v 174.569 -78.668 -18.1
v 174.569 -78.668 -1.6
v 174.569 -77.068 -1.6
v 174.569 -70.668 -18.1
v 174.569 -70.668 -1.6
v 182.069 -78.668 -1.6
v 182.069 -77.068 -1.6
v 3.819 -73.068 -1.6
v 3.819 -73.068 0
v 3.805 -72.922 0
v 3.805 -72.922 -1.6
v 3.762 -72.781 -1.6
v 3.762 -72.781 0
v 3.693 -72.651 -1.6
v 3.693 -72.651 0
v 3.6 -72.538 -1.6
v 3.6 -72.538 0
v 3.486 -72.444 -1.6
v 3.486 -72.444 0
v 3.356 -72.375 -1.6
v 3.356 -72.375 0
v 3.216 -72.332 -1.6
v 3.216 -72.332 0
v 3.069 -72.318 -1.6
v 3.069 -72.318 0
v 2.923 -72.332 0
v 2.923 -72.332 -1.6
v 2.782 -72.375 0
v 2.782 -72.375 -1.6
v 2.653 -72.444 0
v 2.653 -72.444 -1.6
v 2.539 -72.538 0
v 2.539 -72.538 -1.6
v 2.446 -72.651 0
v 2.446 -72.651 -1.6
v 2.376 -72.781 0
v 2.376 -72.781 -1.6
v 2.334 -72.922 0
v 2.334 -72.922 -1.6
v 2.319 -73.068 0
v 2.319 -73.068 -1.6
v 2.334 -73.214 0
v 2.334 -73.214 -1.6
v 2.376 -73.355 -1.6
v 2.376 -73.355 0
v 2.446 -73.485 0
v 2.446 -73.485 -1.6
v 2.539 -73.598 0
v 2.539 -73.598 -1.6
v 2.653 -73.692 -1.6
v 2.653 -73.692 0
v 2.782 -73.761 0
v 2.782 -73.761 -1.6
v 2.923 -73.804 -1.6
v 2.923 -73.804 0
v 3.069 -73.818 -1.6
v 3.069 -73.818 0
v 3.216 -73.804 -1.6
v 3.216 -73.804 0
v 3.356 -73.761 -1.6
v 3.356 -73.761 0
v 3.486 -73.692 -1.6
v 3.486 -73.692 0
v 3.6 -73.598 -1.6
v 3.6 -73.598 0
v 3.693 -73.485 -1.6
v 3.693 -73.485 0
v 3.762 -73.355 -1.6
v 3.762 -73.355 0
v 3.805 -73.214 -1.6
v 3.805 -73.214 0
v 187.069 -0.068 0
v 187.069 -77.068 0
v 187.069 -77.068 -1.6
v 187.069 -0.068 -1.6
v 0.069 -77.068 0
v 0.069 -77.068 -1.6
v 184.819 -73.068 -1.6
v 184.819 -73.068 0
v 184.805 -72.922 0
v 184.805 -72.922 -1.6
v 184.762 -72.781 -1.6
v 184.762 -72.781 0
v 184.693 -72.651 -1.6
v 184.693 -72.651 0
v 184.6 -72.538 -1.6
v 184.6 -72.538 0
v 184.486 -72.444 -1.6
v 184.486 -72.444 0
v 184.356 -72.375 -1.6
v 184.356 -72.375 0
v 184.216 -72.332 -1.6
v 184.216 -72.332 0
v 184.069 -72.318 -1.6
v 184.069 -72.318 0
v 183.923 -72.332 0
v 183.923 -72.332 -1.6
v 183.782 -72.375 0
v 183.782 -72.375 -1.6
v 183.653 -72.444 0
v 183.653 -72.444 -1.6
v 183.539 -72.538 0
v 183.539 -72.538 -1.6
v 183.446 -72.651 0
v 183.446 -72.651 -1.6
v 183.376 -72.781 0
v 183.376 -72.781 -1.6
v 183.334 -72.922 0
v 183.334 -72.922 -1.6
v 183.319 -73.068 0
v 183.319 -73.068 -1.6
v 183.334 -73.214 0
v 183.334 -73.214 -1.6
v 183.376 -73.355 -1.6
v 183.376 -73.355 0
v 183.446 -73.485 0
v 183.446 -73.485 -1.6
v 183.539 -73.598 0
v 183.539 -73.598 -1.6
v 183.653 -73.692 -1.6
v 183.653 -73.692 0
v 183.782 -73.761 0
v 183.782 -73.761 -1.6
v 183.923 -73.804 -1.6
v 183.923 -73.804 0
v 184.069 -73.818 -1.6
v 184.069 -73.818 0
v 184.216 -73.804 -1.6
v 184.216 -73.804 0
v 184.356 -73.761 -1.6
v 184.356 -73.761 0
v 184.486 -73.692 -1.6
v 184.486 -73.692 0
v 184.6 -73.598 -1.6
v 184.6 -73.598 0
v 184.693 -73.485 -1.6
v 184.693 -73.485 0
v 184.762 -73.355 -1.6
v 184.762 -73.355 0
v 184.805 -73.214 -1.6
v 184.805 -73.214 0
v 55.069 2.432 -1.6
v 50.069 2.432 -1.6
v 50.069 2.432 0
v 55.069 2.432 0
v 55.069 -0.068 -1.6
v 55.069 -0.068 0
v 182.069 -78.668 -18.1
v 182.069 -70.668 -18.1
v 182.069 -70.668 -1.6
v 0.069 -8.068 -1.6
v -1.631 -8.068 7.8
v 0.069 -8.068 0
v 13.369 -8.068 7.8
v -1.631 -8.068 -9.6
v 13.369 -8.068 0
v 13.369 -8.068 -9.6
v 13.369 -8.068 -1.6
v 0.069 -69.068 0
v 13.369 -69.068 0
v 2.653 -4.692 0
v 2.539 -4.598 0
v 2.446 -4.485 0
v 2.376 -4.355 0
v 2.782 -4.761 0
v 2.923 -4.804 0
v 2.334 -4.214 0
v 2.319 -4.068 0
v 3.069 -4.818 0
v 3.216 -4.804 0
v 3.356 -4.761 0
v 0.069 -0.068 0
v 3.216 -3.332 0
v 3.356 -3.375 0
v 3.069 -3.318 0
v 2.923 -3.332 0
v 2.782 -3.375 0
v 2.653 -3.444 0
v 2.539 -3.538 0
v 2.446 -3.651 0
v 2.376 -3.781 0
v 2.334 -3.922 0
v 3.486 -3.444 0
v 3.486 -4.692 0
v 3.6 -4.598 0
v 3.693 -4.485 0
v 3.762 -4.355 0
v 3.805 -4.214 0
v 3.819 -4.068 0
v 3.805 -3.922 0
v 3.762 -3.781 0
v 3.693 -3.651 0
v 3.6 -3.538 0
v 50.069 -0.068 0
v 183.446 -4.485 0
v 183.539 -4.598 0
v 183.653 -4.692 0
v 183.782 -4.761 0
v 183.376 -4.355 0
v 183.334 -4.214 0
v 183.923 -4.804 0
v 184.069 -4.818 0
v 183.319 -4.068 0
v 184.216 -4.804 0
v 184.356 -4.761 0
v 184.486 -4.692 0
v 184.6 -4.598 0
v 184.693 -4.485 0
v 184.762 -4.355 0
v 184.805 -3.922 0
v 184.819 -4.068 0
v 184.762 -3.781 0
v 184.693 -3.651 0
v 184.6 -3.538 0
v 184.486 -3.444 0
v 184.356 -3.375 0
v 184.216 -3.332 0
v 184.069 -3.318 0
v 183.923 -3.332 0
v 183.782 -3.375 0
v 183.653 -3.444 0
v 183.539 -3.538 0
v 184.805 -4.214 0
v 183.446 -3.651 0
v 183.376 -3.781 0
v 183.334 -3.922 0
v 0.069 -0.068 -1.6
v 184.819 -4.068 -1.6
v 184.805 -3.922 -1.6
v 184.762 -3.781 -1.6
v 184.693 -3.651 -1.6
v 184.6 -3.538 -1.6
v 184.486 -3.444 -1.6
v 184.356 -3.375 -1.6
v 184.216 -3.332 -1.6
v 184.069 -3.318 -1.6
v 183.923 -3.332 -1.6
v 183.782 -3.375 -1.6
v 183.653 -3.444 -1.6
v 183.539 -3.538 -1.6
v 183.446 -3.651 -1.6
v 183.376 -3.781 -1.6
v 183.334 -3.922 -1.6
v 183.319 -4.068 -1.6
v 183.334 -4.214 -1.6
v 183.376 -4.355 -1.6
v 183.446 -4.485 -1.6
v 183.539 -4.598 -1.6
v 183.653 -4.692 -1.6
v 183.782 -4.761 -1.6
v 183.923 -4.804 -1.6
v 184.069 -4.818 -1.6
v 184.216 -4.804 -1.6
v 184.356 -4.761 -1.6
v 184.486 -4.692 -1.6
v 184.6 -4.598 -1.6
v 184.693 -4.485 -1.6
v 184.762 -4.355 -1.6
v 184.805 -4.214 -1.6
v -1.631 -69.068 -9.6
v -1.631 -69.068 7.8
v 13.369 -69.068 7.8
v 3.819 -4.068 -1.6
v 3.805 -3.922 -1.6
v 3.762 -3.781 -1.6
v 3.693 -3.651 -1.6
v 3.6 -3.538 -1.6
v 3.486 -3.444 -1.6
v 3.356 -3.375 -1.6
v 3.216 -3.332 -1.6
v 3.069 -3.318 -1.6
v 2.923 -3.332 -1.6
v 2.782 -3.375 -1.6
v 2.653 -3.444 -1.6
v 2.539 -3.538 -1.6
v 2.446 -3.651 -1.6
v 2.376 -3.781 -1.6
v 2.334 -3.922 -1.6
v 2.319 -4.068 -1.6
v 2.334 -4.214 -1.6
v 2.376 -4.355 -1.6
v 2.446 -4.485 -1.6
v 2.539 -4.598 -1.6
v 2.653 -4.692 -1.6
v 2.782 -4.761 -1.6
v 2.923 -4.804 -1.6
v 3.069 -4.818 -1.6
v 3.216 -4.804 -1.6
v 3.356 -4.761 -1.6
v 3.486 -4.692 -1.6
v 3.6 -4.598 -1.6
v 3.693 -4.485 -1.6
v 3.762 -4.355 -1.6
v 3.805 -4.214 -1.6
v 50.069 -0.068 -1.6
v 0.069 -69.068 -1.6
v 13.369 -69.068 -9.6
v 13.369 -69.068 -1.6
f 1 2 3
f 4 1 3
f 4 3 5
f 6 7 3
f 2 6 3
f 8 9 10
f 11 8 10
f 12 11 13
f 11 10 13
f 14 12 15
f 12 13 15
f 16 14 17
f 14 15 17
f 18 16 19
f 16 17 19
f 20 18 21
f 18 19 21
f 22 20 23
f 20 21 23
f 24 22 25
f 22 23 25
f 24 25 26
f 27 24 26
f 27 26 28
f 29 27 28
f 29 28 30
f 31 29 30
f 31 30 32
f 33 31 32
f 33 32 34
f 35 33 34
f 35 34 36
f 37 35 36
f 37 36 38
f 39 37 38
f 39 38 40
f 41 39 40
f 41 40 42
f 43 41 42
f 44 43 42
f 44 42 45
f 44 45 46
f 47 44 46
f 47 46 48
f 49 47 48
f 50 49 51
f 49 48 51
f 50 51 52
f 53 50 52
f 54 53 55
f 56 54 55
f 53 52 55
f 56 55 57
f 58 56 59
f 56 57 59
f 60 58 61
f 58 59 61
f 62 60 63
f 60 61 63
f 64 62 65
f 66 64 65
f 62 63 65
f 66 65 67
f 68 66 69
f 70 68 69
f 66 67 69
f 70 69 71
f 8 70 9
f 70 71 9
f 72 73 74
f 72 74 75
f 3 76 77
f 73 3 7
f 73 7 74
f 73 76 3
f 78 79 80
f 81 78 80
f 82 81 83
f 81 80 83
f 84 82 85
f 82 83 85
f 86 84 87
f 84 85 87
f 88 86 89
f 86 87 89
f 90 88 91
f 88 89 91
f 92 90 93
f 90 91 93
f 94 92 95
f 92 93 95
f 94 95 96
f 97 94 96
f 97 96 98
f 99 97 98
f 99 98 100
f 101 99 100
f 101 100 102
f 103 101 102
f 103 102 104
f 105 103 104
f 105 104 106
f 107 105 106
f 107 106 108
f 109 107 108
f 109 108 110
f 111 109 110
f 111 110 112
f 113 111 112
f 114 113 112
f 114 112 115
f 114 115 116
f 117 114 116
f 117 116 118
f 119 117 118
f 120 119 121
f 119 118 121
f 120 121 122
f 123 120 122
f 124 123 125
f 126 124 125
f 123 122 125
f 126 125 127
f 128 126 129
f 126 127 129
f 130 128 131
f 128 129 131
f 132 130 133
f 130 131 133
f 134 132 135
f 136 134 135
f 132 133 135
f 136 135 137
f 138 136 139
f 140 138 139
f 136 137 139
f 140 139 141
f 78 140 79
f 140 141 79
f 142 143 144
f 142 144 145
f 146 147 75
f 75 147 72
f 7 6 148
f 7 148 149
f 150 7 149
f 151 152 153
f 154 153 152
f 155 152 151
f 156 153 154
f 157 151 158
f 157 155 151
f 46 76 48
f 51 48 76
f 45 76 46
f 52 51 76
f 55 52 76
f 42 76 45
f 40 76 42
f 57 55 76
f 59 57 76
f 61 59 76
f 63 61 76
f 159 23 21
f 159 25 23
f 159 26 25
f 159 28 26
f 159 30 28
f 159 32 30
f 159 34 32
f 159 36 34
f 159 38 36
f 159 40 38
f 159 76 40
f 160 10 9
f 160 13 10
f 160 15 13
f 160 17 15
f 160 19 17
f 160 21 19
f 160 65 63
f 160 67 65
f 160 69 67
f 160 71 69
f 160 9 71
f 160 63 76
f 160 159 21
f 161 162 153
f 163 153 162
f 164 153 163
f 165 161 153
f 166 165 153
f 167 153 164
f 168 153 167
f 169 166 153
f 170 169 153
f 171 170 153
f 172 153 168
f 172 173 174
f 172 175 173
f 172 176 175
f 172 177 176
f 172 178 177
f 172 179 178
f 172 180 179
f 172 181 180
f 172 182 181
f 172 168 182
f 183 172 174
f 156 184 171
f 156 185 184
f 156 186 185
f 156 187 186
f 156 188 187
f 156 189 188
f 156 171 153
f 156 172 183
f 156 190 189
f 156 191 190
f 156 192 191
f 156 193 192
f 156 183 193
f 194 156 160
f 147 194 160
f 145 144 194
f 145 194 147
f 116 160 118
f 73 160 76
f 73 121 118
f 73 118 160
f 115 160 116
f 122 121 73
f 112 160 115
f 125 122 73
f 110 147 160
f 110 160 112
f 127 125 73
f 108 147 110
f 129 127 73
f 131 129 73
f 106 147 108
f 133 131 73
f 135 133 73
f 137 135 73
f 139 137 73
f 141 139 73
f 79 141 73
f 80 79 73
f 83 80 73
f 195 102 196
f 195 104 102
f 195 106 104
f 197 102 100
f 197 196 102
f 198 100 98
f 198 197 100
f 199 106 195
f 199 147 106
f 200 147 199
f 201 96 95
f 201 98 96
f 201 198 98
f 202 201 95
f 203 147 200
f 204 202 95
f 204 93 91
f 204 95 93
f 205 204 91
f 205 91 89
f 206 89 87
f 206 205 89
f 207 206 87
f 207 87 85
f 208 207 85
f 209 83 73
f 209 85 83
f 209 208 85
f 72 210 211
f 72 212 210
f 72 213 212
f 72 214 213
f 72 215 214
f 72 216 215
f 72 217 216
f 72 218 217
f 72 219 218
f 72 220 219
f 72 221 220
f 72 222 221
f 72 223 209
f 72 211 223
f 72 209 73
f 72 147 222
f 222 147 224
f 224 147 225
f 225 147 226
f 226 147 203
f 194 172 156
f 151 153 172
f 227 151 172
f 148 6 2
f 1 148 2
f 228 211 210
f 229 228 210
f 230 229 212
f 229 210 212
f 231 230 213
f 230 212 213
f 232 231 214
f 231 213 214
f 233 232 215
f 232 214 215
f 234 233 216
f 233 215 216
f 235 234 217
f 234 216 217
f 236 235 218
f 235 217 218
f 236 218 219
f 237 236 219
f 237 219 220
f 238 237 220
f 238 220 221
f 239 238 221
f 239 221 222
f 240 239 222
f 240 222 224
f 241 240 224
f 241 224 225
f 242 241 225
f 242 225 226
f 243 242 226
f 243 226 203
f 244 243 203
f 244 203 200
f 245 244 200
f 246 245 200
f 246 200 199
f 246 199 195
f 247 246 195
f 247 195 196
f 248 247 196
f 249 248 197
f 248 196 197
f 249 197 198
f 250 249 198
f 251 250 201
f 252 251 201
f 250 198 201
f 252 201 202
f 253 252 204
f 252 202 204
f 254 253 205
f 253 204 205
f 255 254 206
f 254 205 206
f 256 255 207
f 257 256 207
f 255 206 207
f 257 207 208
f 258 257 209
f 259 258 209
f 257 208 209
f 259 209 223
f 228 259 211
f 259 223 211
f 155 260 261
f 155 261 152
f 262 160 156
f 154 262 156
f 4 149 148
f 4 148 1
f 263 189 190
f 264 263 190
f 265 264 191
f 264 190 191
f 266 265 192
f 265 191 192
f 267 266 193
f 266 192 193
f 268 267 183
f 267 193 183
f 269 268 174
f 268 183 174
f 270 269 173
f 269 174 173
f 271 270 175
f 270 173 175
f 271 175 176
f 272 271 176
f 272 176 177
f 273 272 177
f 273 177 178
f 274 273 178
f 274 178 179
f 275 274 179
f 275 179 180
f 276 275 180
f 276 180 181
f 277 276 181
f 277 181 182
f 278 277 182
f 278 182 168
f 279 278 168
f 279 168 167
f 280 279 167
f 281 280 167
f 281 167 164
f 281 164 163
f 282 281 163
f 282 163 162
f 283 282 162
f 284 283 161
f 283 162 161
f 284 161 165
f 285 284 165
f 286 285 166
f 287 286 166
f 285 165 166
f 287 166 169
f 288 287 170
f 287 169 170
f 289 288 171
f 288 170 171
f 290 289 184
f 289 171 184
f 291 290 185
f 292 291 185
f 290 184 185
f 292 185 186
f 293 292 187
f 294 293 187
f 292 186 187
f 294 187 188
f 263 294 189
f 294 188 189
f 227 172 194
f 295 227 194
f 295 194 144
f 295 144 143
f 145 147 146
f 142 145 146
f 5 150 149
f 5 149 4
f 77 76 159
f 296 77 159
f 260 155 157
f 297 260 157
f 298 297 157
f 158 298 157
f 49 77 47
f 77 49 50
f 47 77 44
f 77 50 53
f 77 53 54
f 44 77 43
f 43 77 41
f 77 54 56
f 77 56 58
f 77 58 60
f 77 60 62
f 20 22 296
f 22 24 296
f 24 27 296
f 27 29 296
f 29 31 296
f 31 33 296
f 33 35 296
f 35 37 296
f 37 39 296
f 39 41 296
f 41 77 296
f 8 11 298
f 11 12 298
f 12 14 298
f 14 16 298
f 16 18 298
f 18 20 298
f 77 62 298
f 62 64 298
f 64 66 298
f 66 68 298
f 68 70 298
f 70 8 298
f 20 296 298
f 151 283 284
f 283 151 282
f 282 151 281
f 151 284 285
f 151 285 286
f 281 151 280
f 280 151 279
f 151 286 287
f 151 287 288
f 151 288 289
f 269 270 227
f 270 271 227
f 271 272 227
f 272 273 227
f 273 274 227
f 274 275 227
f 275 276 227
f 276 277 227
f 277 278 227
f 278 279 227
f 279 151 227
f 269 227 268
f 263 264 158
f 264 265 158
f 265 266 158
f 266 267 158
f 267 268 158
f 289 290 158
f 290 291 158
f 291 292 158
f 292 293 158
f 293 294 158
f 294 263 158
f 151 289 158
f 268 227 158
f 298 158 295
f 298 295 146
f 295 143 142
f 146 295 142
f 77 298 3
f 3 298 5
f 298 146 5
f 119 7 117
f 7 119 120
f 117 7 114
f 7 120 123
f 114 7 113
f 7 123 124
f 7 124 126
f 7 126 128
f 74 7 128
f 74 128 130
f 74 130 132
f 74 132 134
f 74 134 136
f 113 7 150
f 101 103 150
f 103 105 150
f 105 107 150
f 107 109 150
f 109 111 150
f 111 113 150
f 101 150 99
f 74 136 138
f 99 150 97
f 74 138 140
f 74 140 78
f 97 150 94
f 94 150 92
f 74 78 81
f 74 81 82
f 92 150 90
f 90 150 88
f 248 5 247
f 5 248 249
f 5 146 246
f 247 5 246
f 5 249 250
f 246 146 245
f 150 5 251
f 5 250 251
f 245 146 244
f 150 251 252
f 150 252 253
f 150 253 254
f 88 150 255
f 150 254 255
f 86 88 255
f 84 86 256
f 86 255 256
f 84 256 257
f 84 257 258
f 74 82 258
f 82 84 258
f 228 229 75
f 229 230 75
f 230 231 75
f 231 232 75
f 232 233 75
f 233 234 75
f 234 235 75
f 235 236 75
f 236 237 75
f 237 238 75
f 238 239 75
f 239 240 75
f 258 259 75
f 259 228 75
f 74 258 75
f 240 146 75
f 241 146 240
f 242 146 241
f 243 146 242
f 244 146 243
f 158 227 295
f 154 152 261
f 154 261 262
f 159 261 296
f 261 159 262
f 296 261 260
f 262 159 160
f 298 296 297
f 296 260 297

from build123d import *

# Parameters (mm, degrees)
KEEPOUTLAYER_W       = 186.9999816
KEEPOUTLAYER_H       = 76.9999984
EXTRUDE_1_DEPTH      = 1.6
VIAHOLELAYER_R       = 0.7499985
CUT_EXTRUDE_1_DEPTH  = 203.32893066
EXTRUDE_2_DEPTH      = 7.8
EXTRUDE_2_DEPTH_BACK = 9.6
SKETCH_1_W           = 15
SKETCH_1_H           = 60.9999984
SKETCH_2_W           = 5
SKETCH_2_H           = 1.6
EXTRUDE_3_DEPTH      = 2.5
SKETCH_4_W           = 7.5
SKETCH_4_H           = 8
EXTRUDE_4_DEPTH      = 16.5


with BuildPart() as part:
    # KeepOutLayer → Бобышка-Вытянуть1 (new body)
    with BuildSketch(Plane.XY):
        with Locations((93.56941662, -38.56797722)):
            Rectangle(KEEPOUTLAYER_W, KEEPOUTLAYER_H)
    extrude(amount=-EXTRUDE_1_DEPTH)

    # ViaHoleLayer → Вырез-Вытянуть1 (cut, through all)
    with BuildSketch(Plane.XY):
        with Locations((3.0693995, -73.06799966)):
            Circle(VIAHOLELAYER_R)
        with Locations((3.0693995, -4.0680005)):
            Circle(VIAHOLELAYER_R)
        with Locations((184.06940072, -73.06799966)):
            Circle(VIAHOLELAYER_R)
        with Locations((184.06940072, -4.0680005)):
            Circle(VIAHOLELAYER_R)
    extrude(amount=-CUT_EXTRUDE_1_DEPTH, mode=Mode.SUBTRACT)

    # Эскиз1 → Бобышка-Вытянуть2 (add, two sides: drawn at the far end of the back side and taken through both)
    with BuildSketch(Plane.XY.offset(-EXTRUDE_2_DEPTH_BACK)):
        with Locations((5.86942582, -38.56797722)):
            Rectangle(SKETCH_1_W, SKETCH_1_H)
    extrude(amount=EXTRUDE_2_DEPTH + EXTRUDE_2_DEPTH_BACK)

    # Эскиз2 → Бобышка-Вытянуть3 (add)
    with BuildSketch(Plane(origin=(0, -0.06797802, 0), x_dir=(1, 0, 0), z_dir=(0, 1, 0))):
        with Locations((52.56942582, 0.8)):
            Rectangle(SKETCH_2_W, SKETCH_2_H)
    extrude(amount=EXTRUDE_3_DEPTH)

    # Эскиз4 → Бобышка-Вытянуть4 (add)
    with BuildSketch(Plane(origin=(0, 0, -1.6), x_dir=(-1, 0, 0), z_dir=(0, 0, -1))):
        with Locations((-178.31940742, -74.66797642)):
            Rectangle(SKETCH_4_W, SKETCH_4_H)
    extrude(amount=EXTRUDE_4_DEPTH)


solid = part.part
